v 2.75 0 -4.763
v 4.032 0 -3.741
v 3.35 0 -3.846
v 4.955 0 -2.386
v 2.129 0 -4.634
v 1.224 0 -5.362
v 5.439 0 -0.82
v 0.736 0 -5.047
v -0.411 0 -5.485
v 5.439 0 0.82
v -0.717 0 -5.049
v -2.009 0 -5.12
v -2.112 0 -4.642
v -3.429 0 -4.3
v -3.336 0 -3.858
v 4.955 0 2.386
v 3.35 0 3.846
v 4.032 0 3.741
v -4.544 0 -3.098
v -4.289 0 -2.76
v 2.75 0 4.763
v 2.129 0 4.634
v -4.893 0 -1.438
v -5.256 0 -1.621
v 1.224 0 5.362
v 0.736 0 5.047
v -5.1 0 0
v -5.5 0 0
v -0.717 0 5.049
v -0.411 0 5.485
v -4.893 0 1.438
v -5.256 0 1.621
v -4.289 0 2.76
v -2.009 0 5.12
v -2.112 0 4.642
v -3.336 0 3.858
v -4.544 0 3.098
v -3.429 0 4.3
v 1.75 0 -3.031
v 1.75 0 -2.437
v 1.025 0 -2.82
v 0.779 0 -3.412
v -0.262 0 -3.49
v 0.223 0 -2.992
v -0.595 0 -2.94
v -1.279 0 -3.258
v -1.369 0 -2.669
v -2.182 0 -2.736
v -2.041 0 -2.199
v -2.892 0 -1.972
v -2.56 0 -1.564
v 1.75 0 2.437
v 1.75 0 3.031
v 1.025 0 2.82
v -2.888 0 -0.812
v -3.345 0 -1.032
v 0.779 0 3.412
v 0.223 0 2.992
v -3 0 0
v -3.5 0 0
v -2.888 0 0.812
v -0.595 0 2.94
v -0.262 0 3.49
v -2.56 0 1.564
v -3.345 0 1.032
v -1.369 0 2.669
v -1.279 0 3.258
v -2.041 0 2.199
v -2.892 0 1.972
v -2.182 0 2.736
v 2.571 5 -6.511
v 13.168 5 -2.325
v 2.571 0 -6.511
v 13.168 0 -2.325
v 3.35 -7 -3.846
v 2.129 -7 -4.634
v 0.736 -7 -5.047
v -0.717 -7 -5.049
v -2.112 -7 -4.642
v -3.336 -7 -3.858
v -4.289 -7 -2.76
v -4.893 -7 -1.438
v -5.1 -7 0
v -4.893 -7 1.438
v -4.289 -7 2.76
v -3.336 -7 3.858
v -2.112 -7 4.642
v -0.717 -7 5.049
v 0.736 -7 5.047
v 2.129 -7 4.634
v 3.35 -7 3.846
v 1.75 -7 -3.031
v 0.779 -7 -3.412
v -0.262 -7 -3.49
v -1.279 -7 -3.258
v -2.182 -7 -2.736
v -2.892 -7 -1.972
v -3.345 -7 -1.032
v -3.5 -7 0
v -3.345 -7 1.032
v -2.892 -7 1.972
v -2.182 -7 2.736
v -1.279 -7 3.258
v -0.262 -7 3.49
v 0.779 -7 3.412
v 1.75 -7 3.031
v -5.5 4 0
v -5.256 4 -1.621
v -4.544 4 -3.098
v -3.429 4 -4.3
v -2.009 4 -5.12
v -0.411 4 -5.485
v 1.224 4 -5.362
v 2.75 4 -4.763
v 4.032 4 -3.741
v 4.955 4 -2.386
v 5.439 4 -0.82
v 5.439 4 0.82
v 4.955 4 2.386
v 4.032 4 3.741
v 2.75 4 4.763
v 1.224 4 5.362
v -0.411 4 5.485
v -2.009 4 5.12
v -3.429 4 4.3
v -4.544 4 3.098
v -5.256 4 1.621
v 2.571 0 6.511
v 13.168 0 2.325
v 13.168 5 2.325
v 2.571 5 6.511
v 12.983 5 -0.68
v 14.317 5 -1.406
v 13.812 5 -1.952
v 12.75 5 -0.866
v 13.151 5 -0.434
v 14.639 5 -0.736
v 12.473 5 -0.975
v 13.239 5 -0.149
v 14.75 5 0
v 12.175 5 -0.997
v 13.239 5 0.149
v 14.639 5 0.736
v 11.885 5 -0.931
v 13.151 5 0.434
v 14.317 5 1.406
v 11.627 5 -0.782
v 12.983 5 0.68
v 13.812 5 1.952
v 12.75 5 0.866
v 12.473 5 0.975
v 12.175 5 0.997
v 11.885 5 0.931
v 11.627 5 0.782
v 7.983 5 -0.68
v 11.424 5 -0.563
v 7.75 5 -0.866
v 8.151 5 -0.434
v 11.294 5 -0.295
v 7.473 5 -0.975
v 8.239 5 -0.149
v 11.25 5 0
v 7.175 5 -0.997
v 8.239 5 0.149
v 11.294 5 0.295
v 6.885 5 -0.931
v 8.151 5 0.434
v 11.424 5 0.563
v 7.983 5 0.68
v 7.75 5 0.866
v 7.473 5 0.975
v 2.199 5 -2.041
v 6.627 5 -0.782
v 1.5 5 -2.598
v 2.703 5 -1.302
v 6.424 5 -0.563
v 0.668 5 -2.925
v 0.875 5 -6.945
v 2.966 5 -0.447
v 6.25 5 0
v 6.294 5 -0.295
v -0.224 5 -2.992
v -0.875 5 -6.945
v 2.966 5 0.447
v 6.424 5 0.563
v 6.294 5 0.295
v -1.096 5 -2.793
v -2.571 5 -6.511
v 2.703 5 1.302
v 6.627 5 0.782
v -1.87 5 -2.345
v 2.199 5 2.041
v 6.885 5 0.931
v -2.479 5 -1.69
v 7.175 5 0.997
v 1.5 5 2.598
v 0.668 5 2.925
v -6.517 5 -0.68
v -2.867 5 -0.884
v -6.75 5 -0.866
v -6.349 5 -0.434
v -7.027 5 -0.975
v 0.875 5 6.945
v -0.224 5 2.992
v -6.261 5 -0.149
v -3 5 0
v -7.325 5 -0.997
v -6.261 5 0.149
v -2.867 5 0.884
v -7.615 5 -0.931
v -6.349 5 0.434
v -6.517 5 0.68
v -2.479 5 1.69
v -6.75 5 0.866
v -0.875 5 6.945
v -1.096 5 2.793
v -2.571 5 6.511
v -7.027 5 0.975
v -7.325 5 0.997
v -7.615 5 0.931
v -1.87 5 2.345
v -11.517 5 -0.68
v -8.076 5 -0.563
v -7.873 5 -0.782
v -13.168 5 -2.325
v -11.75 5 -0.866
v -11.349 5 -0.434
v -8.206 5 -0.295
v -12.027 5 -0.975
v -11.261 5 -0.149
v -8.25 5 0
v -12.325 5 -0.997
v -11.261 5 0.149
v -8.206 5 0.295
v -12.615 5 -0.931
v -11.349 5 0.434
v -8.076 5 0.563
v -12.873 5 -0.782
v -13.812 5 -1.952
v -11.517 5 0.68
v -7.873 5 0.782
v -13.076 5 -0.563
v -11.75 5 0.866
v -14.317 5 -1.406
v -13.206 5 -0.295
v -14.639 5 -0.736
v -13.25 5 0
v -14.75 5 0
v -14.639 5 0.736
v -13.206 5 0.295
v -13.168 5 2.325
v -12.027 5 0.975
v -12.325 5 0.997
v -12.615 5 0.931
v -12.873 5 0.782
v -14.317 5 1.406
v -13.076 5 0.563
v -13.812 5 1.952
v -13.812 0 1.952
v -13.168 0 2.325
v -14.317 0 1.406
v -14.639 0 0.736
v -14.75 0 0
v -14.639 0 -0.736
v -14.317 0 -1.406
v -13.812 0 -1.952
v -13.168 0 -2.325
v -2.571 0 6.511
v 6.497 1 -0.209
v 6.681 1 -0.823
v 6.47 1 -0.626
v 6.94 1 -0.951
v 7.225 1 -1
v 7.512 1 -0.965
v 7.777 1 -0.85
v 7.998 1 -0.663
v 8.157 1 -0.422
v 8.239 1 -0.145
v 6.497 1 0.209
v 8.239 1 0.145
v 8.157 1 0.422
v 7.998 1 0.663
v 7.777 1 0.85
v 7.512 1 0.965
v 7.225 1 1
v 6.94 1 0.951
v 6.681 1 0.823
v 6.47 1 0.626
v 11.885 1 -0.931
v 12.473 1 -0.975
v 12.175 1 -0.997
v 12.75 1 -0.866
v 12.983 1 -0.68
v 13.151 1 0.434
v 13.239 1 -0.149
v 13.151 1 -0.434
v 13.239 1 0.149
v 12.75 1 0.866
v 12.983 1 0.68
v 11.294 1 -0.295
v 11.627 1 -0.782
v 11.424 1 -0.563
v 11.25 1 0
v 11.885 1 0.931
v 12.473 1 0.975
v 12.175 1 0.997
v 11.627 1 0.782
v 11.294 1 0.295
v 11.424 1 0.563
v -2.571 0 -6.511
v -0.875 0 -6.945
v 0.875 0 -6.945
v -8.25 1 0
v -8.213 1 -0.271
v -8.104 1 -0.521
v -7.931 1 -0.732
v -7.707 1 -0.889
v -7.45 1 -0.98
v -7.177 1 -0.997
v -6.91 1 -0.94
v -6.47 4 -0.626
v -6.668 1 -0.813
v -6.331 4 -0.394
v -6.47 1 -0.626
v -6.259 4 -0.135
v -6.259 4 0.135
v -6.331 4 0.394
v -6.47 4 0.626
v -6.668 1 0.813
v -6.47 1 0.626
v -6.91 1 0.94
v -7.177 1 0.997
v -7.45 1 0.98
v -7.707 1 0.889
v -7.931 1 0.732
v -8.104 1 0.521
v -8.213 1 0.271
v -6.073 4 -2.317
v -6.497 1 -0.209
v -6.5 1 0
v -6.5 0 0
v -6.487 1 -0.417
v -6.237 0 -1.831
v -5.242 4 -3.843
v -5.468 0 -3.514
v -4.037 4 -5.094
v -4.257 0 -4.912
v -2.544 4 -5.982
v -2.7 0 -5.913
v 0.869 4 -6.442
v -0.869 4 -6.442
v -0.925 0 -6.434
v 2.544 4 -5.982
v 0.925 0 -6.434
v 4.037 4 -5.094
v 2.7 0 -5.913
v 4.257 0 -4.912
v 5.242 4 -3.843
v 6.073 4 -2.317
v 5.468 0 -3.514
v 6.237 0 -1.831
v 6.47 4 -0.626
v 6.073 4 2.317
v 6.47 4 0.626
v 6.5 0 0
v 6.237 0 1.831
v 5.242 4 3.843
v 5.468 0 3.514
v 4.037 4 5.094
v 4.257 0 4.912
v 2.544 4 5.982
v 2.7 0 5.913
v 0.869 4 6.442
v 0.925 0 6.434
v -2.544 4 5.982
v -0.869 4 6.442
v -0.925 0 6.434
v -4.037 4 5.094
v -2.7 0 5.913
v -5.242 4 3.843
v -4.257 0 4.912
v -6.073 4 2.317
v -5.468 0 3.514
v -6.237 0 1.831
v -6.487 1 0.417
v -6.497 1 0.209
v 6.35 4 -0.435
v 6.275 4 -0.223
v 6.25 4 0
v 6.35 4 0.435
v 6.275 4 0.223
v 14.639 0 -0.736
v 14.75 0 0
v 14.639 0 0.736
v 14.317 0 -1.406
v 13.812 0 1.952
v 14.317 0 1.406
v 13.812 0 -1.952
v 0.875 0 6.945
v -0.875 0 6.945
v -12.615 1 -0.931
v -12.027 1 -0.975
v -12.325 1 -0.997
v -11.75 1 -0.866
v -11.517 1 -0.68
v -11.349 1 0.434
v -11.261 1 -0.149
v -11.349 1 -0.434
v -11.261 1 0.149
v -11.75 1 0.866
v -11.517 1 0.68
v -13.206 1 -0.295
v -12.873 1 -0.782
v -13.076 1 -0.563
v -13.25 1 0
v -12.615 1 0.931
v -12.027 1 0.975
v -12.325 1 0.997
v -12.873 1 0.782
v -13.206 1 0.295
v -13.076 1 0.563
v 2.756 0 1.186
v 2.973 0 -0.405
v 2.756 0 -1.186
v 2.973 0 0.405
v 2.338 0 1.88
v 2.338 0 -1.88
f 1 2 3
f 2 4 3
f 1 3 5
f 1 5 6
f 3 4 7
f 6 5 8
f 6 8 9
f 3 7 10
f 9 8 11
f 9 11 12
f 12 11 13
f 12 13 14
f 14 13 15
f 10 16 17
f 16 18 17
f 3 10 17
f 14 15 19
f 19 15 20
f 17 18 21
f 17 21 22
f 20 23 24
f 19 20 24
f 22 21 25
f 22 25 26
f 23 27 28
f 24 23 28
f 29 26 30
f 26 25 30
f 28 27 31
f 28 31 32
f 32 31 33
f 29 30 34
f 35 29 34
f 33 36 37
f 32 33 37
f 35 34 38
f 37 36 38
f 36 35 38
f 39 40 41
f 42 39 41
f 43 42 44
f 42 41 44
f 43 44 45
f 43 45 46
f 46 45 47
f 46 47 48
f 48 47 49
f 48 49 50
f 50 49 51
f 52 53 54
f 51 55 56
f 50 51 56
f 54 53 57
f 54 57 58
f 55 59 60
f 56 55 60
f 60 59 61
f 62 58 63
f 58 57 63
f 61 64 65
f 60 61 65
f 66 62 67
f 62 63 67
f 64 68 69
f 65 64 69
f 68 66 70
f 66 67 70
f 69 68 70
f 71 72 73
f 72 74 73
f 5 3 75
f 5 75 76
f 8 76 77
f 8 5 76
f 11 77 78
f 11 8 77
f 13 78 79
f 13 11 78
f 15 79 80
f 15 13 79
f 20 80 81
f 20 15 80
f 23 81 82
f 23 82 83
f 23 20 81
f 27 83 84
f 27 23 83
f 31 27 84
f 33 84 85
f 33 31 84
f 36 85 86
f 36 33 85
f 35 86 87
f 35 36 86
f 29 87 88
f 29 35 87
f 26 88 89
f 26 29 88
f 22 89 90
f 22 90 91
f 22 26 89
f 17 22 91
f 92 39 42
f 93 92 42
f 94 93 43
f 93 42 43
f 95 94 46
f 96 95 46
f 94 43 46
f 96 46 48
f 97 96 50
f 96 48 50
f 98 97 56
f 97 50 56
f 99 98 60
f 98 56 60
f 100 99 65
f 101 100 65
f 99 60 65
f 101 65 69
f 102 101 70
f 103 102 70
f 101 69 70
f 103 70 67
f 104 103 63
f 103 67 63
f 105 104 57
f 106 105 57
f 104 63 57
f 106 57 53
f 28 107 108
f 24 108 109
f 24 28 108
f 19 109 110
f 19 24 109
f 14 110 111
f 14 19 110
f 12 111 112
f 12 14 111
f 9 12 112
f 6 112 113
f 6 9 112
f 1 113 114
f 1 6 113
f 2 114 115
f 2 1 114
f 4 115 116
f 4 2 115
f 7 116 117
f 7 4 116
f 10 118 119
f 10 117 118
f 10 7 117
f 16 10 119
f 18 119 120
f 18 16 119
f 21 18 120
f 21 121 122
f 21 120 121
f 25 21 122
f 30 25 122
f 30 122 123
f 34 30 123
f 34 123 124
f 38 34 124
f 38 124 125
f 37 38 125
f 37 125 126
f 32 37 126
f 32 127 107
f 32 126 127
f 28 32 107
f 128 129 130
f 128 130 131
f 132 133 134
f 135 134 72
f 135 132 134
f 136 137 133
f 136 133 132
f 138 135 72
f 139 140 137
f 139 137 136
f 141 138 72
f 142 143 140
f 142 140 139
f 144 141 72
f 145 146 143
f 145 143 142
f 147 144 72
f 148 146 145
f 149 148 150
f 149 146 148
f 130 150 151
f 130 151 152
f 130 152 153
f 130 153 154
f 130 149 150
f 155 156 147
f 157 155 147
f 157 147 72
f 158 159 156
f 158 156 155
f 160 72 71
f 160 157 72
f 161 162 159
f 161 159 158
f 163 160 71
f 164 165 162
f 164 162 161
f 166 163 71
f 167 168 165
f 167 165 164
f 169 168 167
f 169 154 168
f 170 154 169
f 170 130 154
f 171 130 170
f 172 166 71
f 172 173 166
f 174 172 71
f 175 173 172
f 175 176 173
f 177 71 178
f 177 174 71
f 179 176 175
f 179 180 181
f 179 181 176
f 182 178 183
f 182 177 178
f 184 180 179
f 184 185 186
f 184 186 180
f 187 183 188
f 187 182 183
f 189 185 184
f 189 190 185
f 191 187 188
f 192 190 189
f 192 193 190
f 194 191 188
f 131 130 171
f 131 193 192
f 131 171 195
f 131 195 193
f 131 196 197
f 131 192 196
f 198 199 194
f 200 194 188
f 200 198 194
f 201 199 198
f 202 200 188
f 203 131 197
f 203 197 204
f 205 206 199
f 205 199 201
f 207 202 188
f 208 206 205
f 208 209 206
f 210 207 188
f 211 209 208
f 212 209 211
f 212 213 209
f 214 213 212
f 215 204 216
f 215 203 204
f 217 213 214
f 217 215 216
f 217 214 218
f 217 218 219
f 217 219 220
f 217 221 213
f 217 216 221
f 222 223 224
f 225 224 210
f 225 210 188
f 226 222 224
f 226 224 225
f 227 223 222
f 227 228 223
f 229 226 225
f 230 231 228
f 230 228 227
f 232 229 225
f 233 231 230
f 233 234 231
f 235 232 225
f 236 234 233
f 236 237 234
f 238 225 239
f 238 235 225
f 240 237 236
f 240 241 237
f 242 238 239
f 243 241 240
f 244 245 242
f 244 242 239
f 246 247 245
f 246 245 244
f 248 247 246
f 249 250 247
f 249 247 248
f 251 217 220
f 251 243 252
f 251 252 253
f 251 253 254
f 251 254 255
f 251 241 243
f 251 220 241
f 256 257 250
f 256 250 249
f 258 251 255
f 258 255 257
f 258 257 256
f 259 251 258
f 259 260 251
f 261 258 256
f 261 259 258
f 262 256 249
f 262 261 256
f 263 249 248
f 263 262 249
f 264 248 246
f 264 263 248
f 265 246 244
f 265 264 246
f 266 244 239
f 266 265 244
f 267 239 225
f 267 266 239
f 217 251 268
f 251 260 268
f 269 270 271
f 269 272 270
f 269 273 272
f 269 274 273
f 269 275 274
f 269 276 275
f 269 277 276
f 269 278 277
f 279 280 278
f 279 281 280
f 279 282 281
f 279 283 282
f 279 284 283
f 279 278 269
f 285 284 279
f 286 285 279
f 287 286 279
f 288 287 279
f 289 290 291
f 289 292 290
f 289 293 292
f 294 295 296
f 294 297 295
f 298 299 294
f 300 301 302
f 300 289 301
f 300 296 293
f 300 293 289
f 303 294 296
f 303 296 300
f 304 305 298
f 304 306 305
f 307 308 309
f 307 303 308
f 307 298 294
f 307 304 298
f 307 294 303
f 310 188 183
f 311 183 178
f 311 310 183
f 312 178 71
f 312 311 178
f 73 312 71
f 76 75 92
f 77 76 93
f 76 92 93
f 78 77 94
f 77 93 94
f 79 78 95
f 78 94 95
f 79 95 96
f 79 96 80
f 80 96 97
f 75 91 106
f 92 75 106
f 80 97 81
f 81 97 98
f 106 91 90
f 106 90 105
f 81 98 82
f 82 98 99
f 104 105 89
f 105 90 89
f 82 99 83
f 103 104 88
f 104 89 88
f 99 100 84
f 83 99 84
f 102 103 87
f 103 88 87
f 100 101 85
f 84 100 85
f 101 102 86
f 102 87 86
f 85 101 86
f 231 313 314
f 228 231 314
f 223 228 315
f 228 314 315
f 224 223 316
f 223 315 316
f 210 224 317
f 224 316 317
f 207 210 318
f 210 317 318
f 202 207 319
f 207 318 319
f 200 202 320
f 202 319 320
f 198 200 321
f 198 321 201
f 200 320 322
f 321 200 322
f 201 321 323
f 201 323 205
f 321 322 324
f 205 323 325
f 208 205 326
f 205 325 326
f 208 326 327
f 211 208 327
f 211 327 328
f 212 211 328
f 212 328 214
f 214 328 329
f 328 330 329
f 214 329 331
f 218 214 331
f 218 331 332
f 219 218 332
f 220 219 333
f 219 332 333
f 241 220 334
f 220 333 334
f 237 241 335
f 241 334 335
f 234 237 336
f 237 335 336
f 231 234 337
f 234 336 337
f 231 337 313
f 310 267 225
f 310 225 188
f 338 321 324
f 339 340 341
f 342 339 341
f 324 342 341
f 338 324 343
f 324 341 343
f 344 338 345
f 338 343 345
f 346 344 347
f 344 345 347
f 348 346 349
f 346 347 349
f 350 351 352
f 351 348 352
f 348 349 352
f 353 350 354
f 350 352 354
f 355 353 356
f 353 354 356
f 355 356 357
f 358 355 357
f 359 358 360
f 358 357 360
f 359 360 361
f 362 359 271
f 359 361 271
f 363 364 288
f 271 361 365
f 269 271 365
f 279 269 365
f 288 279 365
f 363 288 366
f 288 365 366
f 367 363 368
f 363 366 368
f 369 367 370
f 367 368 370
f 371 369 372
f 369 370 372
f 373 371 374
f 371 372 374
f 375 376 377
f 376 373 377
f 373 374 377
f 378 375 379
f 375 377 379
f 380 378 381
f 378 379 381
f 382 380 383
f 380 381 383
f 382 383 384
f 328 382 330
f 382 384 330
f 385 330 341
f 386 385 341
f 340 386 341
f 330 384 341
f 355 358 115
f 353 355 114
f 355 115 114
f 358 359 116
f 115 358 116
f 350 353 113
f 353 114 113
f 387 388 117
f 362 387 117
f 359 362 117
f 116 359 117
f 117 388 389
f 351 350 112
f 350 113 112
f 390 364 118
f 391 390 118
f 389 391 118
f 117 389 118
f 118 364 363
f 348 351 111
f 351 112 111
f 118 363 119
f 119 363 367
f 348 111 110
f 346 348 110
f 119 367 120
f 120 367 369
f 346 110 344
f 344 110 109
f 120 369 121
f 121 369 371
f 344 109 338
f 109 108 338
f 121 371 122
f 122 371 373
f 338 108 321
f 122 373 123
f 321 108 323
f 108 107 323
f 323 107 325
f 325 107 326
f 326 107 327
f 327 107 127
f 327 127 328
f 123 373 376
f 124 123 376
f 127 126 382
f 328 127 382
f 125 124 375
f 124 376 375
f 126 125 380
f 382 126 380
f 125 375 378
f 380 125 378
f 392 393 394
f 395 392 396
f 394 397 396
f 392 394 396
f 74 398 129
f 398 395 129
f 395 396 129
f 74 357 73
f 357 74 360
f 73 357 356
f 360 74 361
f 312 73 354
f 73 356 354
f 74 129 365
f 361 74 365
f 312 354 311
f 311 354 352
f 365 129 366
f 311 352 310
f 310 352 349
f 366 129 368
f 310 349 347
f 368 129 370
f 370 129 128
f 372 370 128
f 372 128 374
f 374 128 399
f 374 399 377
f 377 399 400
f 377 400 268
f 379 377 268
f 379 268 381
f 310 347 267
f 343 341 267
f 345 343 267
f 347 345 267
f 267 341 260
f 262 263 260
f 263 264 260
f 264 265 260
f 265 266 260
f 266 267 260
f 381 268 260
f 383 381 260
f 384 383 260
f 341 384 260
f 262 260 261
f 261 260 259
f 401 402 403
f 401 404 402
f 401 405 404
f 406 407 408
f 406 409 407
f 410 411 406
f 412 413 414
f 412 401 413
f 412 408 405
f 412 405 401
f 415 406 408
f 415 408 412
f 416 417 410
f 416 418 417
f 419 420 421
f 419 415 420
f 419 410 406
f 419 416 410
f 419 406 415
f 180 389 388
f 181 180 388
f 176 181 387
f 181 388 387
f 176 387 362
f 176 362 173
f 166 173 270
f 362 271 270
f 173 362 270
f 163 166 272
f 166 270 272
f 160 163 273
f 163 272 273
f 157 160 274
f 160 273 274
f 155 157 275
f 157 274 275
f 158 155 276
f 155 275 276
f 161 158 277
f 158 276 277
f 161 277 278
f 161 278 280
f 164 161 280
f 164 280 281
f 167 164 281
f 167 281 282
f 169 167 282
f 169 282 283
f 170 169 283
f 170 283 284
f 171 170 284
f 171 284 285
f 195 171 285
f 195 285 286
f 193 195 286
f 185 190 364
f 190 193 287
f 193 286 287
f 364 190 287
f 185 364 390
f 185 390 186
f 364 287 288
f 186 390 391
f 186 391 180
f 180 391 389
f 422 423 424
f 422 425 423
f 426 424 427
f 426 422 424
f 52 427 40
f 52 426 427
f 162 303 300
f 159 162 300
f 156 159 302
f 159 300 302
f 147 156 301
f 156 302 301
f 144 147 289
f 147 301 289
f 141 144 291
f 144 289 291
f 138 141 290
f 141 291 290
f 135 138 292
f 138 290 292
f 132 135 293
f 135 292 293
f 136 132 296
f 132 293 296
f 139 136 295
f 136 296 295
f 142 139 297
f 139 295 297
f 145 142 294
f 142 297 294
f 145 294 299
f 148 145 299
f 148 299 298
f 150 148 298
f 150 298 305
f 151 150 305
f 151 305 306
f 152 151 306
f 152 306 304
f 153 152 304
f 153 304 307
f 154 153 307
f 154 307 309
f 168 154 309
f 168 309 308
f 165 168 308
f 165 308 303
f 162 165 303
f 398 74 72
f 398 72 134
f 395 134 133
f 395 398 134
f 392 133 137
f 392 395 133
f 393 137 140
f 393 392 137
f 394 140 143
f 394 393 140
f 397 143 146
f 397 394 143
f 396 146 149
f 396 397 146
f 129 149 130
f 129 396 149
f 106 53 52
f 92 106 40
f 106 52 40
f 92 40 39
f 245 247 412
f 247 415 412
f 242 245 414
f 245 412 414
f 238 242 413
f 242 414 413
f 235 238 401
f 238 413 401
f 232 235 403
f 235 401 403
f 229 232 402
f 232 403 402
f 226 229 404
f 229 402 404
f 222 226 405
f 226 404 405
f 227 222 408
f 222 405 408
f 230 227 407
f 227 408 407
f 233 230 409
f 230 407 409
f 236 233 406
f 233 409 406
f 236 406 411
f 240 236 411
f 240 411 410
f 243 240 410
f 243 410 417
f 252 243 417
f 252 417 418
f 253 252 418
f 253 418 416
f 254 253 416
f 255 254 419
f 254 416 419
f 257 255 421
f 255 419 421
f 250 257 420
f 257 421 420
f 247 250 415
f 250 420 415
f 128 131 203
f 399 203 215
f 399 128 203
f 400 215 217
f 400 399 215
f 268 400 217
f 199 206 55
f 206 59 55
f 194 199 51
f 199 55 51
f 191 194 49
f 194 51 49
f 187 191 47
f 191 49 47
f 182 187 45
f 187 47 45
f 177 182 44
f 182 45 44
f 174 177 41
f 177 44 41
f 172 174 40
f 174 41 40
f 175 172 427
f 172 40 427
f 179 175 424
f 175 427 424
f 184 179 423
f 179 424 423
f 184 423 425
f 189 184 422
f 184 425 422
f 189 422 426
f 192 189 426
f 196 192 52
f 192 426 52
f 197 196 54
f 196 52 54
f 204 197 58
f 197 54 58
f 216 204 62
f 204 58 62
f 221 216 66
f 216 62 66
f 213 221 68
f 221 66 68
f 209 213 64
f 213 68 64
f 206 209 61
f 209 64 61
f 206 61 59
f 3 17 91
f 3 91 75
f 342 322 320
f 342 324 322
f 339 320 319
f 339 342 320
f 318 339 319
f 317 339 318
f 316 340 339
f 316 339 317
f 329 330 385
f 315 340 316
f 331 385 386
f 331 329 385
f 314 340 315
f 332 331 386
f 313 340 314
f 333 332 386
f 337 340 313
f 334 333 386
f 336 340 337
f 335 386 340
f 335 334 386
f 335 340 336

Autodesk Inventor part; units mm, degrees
ref_plane "YZ Plane" through (0, 0, 0) normal (1, 0, 0) x (0, 1, 0)
ref_plane "XZ Plane" through (0, 0, 0) normal (0, 1, 0) x (-1, 0, 0)
ref_plane "XY Plane" through (0, 0, 0) normal (0, 0, 1) x (1, 0, 0)
sketch "スケッチ1" plane through (0, 0, 0) normal (0, 1, 0) x (-1, 0, 0)
  arc A0 (-1.75, -3.0311) -> (-1.75, 3.0311) centre (0, 0) ccw
  arc A1 (-3.35, -3.8455) -> (-3.35, 3.8455) centre (0, 0) ccw
  line L0 (-1.75, 3.0311) -> (-1.75, -3.0311)
  line L1 (-3.35, 3.8455) -> (-3.35, -3.8455)
  point P0 (-1.75, 0)
  point P1 (3.5, 0)
  dimension "d0" = 7
  dimension "d1" = 1.6
  dimension "d3" = 1.6
  dimension "d21" = 5.25
extrude "押し出し1" add sketch "スケッチ1" against normal blind 7
sketch "スケッチ2" plane through (0, 0, 0) normal (0, 1, 0) x (-1, 0, 0)
  circle A0 centre (0, 0) radius 3
  circle A1 centre (7.25, 0) radius 1
  circle A2 centre (12.25, 0) radius 1
  line L0 (21.35, 0) -> (-16.3472, 0)
  line L1 (-21.4194, 0) -> (25.6478, 0)
  line L2 (0, 13.6596) -> (0, -18.5916)
  circle A3 centre (-7.25, 0) radius 1
  circle A4 centre (-12.25, 0) radius 1
  arc A5 (13.1684, -2.3252) -> (13.1684, 2.3252) centre (12.25, 0) ccw
  line L3 (13.1684, 2.3252) -> (2.5714, 6.5106)
  line L4 (13.1684, -2.3252) -> (2.5714, -6.5106)
  arc A6 (-13.1684, 2.3252) -> (-13.1684, -2.3252) centre (-12.25, 0) ccw
  line L5 (-13.1684, 2.3252) -> (-2.5714, 6.5106)
  line L6 (-13.1684, -2.3252) -> (-2.5714, -6.5106)
  arc A7 (-2.5714, -6.5106) -> (2.5714, -6.5106) centre (0, 0) ccw
  arc A8 (2.5714, 6.5106) -> (-2.5714, 6.5106) centre (0, 0) ccw
  circle A9 centre (0, 0) radius 5.5
  circle A10 centre (0, 0) radius 6.5
  dimension "d6" = 6
  dimension "d7" = 7.25
  dimension "d8" = 5
  dimension "d9" = 2
  dimension "d11" = 5
  dimension "d12" = 7
  dimension "d17" = 11
  dimension "d18" = 13
extrude "押し出し2" add sketch "スケッチ2" along normal blind 1 contours L0 A9 L2 A0 | A0 L2 A9 L0 | A0 L0 A9 L2 | L2 A9 L0 A0 | A9 L2 A10 A1 L0 | L0 A1 A10 L2 A9 | A9 L0 A3 A10 L2 | L2 A10 A3 L0 A9 | L0 A10 A1 | A1 A10 L0 | A10 A3 L0 A4 A6 L5 A8 L2 | L2 A8 L3 A5 L0 A2 A1 A10 | A10 A1 L0 A2 A5 L4 A7 L2 | L2 A7 L6 A6 L0 A4 A3 A10 | A1 L0 A10 | A10 L0 A1 | A3 A10 L0 | L0 A10 A3 | A10 L0 A3 | A3 L0 A10 | L0 A2 | A2 L0 | A4 L0 | L0 A4
extrude "押し出し3" add sketch "スケッチ2" along normal blind 5 contours L0 A9 L2 A0 | A0 L2 A9 L0 | A0 L0 A9 L2 | L2 A9 L0 A0 | A9 L2 A10 A1 L0 | L0 A1 A10 L2 A9 | A9 L0 A3 A10 L2 | L2 A10 A3 L0 A9 | A10 A3 L0 A4 A6 L5 A8 L2 | L2 A8 L3 A5 L0 A2 A1 A10 | A10 A1 L0 A2 A5 L4 A7 L2 | L2 A7 L6 A6 L0 A4 A3 A10
extrude "押し出し4" cut sketch "スケッチ2" along normal blind 4 contours A9 L2 A10 A1 L0 | L0 A1 A10 L2 A9 | A9 L0 A3 A10 L2 | L2 A10 A3 L0 A9 | L0 A10 A1 | A1 A10 L0 | A3 A10 L0 | L0 A10 A3 picked at (6.3418, -0.0745) picked at (6.3418, 0.0745) picked at (-6.3418, -0.0745) picked at (-6.3418, 0.0745)
properties part number "stick"
